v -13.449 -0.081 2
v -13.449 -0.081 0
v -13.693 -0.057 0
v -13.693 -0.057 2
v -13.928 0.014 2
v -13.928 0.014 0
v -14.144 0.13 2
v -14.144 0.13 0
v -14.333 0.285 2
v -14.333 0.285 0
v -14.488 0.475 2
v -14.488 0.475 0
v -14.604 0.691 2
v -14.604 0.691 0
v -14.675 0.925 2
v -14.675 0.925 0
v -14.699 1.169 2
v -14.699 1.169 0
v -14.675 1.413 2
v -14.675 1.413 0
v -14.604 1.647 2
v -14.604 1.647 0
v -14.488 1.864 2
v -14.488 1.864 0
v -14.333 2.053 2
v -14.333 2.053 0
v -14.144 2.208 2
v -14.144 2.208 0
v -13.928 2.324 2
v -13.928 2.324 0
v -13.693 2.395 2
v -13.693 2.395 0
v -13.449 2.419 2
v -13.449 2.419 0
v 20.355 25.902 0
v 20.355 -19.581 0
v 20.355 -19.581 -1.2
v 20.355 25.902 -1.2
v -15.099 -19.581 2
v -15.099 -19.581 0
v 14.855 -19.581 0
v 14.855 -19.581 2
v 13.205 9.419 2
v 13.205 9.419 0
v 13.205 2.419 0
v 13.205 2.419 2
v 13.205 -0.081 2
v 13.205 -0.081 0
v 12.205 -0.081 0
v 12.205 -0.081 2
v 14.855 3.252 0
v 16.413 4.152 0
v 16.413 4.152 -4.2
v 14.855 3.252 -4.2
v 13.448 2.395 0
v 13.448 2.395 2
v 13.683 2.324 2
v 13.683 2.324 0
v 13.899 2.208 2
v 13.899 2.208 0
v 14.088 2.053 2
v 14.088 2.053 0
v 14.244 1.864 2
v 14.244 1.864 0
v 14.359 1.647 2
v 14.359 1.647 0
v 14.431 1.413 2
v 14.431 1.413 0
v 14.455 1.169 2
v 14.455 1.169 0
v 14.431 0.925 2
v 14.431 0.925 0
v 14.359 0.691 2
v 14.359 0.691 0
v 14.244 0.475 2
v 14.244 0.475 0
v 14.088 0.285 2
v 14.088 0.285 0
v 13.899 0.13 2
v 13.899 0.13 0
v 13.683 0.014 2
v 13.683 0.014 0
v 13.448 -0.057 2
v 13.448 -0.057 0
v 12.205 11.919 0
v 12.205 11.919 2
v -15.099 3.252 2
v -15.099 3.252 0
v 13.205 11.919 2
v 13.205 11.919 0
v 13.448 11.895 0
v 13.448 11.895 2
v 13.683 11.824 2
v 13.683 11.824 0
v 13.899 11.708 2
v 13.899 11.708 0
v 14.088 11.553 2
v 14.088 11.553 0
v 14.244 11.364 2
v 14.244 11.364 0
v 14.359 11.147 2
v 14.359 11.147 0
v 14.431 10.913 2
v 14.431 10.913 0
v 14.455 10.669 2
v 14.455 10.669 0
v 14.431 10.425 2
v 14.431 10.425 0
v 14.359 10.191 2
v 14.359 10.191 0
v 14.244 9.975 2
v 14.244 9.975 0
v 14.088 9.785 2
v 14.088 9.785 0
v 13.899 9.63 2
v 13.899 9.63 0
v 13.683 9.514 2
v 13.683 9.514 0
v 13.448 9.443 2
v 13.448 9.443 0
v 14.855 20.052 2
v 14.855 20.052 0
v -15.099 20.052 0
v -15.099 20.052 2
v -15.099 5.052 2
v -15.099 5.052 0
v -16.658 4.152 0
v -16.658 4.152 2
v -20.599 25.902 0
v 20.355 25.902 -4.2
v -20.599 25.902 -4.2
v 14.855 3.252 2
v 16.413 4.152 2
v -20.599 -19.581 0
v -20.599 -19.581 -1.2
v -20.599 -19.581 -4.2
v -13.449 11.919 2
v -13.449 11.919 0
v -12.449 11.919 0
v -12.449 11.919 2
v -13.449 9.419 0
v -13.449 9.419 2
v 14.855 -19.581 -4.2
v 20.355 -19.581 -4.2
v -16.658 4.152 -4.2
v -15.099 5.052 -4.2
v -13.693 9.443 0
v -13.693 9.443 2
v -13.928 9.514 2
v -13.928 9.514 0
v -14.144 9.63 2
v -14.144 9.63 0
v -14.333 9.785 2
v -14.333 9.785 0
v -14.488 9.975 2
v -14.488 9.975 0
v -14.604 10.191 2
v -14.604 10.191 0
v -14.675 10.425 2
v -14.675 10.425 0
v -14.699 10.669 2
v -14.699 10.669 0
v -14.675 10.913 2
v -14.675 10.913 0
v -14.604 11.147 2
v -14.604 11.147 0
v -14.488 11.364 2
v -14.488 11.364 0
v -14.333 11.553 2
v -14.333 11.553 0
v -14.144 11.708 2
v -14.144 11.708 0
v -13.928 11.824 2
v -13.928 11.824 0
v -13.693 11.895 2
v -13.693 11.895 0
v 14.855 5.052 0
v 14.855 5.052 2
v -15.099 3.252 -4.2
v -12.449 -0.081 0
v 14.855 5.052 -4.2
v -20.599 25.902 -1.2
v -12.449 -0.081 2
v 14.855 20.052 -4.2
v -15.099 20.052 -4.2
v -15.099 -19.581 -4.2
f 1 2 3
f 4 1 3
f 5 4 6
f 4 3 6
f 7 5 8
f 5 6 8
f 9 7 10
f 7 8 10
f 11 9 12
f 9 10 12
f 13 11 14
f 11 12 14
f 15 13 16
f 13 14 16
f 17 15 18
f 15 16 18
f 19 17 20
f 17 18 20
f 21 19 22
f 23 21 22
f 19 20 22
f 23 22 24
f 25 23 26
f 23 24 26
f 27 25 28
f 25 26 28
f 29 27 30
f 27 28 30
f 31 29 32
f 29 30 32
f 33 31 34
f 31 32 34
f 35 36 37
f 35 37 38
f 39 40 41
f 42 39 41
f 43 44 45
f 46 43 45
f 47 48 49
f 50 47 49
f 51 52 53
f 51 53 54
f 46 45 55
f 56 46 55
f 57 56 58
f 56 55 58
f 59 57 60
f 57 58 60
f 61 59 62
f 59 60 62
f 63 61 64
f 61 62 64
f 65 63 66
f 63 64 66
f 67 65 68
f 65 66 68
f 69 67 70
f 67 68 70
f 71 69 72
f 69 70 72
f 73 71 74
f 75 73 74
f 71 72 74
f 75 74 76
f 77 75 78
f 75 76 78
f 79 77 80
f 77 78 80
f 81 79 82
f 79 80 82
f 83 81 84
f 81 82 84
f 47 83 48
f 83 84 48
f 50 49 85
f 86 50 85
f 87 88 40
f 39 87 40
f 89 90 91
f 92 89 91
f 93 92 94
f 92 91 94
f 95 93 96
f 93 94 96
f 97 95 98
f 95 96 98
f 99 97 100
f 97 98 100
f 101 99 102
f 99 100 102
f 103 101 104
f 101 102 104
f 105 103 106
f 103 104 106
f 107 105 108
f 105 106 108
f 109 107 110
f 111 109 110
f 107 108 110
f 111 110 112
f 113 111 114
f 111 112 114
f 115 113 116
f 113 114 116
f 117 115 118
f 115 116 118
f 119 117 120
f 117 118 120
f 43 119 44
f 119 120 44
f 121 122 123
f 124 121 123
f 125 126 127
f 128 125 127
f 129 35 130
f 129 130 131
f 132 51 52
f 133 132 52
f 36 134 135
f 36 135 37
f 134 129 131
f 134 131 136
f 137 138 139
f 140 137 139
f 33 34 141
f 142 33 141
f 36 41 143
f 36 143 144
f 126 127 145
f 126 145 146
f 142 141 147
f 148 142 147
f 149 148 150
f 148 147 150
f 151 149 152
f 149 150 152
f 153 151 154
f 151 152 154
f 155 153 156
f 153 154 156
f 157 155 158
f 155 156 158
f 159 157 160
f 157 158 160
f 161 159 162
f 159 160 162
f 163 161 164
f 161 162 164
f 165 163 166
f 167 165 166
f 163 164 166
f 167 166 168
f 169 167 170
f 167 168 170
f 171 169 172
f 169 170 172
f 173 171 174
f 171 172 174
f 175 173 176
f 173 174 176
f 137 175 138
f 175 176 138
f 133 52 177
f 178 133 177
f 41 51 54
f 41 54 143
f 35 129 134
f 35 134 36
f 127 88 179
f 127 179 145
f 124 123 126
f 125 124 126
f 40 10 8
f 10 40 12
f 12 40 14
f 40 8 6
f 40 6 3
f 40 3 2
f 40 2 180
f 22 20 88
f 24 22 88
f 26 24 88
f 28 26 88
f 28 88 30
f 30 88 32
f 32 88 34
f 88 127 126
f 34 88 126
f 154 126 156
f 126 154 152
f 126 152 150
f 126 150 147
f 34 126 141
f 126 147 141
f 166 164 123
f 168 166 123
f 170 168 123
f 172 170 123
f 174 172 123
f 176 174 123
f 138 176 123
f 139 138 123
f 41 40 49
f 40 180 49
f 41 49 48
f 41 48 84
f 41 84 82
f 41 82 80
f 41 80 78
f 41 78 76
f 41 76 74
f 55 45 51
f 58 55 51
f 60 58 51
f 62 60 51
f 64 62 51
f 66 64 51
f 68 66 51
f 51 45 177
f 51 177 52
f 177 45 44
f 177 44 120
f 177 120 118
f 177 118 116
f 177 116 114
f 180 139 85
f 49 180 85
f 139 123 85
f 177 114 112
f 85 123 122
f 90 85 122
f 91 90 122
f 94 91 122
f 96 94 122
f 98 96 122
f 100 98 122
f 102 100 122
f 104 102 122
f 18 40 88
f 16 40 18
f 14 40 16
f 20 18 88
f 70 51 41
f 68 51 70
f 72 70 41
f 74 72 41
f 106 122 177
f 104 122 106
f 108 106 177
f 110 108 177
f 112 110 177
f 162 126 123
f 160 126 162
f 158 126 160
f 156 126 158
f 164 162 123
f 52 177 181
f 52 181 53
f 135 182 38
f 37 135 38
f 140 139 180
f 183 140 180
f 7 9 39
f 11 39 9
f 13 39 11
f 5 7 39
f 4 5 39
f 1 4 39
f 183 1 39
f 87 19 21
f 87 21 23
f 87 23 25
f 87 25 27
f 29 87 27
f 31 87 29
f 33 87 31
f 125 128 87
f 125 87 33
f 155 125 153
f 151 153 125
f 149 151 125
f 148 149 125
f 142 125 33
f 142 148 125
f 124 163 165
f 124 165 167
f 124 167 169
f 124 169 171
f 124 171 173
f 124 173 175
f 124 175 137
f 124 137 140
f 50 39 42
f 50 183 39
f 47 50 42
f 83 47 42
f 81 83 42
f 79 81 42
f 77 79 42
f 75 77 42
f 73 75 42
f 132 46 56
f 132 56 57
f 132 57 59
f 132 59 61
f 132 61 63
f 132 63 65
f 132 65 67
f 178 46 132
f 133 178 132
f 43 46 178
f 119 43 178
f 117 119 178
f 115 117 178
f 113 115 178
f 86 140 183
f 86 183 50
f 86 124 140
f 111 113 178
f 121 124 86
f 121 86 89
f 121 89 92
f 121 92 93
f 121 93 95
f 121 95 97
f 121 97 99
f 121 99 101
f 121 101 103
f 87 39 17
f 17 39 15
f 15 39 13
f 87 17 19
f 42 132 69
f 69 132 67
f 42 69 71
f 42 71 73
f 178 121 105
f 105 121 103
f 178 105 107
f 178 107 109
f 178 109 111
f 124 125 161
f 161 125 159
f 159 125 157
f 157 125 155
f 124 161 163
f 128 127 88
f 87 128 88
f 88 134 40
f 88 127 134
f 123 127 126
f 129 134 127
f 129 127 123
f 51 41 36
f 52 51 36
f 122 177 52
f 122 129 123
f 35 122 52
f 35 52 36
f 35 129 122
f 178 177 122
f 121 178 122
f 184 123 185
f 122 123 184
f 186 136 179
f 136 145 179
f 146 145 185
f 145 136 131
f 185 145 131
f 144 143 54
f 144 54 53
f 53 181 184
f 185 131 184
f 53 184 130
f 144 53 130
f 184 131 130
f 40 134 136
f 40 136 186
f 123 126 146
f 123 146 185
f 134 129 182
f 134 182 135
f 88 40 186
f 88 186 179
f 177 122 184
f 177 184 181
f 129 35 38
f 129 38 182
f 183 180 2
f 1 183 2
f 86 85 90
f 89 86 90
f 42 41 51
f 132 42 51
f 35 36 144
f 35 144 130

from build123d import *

# Parameters (mm, degrees)
F1_DEPTH = 2
F2_DEPTH = 4.2
F3_DEPTH = 1.2


with BuildPart() as f1:
    # F0 (on Top) → F1 (new body)
    with BuildSketch(Plane.XY):
        Polygon((-15.099153, 3.251887), (-15.099153, -19.581107), (-0.145396, -19.581107), (-0.099153, -19.581107), (14.854604, -19.581107), (14.854604, 3.251887), (16.413449, 4.151887), (14.854604, 5.051887), (14.854604, 20.051887), (-0.122275, 20.051887), (-15.099153, 20.051887), (-15.099153, 5.051887), (-16.657999, 4.151887), align=None)
        with BuildLine():
            ThreePointArc((-13.449153, 9.419125), (-14.699153, 10.669125), (-13.449153, 11.919125))
            Line((-13.449153, 11.919125), (-12.449153, 11.919125))
            Line((-12.449153, 11.919125), (-12.449153, -0.080875))
            Line((-12.449153, -0.080875), (-13.449153, -0.080875))
            ThreePointArc((-13.449153, -0.080875), (-14.699153, 1.169125), (-13.449153, 2.419125))
            Line((-13.449153, 2.419125), (-13.449153, 9.419125))
        make_face(mode=Mode.SUBTRACT)
        with BuildLine():
            ThreePointArc((13.204604, 2.419125), (14.454604, 1.169125), (13.204604, -0.080875))
            Line((13.204604, -0.080875), (12.204604, -0.080875))
            Line((12.204604, -0.080875), (12.204604, 11.919125))
            Line((12.204604, 11.919125), (13.204604, 11.919125))
            ThreePointArc((13.204604, 11.919125), (14.454604, 10.669125), (13.204604, 9.419125))
            Line((13.204604, 9.419125), (13.204604, 2.419125))
        make_face(mode=Mode.SUBTRACT)
    extrude(amount=F1_DEPTH)


with BuildPart() as f2:
    # F0 (on Top) → F2 (new body)
    with BuildSketch(Plane.XY):
        Polygon((-20.599153, -4.098113), (-15.599153, -4.098113), (-15.599153, 3.151887), (-17.331204, 4.151887), (-15.599153, 5.151887), (-15.599153, 20.901887), (-15.599153, 25.901887), (-20.599153, 25.901887), align=None)
        Polygon((-15.599153, 3.151887), (-15.599153, -4.098113), (-20.599153, -4.098113), (-20.599153, -19.581107), (-15.099153, -19.581107), (-15.099153, 3.251887), (-16.657999, 4.151887), (-15.099153, 5.051887), (-15.099153, 20.051887), (-0.122275, 20.051887), (14.854604, 20.051887), (14.854604, 5.051887), (16.413449, 4.151887), (14.854604, 3.251887), (14.854604, -19.581107), (20.354604, -19.581107), (20.354604, -4.098113), (15.354604, -4.098113), (15.354604, 3.151887), (17.086655, 4.151887), (15.354604, 5.151887), (15.354604, 20.901887), (15.354604, 25.901887), (0.299157, 25.901887), (-0.122275, 25.901887), (-0.543707, 25.901887), (-15.599153, 25.901887), (-15.599153, 20.901887), (-15.599153, 5.151887), (-17.331204, 4.151887), align=None)
        Polygon((20.354604, 25.901887), (15.354604, 25.901887), (15.354604, 20.901887), (15.354604, 5.151887), (17.086655, 4.151887), (15.354604, 3.151887), (15.354604, -4.098113), (20.354604, -4.098113), align=None)
    extrude(amount=-F2_DEPTH)


with BuildPart() as f3:
    # F0 (on Top) → F3 (new body)
    with BuildSketch(Plane.XY):
        Polygon((20.354604, 25.901887), (15.354604, 25.901887), (15.354604, 20.901887), (15.354604, 5.151887), (17.086655, 4.151887), (15.354604, 3.151887), (15.354604, -4.098113), (20.354604, -4.098113), align=None)
        Polygon((-15.099153, 3.251887), (-15.099153, -19.581107), (-0.145396, -19.581107), (-0.099153, -19.581107), (14.854604, -19.581107), (14.854604, 3.251887), (16.413449, 4.151887), (14.854604, 5.051887), (14.854604, 20.051887), (-0.122275, 20.051887), (-15.099153, 20.051887), (-15.099153, 5.051887), (-16.657999, 4.151887), align=None)
        with BuildLine():
            ThreePointArc((-13.449153, 9.419125), (-14.699153, 10.669125), (-13.449153, 11.919125))
            Line((-13.449153, 11.919125), (-12.449153, 11.919125))
            Line((-12.449153, 11.919125), (-12.449153, -0.080875))
            Line((-12.449153, -0.080875), (-13.449153, -0.080875))
            ThreePointArc((-13.449153, -0.080875), (-14.699153, 1.169125), (-13.449153, 2.419125))
            Line((-13.449153, 2.419125), (-13.449153, 9.419125))
        make_face(mode=Mode.SUBTRACT)
        with BuildLine():
            ThreePointArc((13.204604, 2.419125), (14.454604, 1.169125), (13.204604, -0.080875))
            Line((13.204604, -0.080875), (12.204604, -0.080875))
            Line((12.204604, -0.080875), (12.204604, 11.919125))
            Line((12.204604, 11.919125), (13.204604, 11.919125))
            ThreePointArc((13.204604, 11.919125), (14.454604, 10.669125), (13.204604, 9.419125))
            Line((13.204604, 9.419125), (13.204604, 2.419125))
        make_face(mode=Mode.SUBTRACT)
        Polygon((-15.599153, 3.151887), (-15.599153, -4.098113), (-20.599153, -4.098113), (-20.599153, -19.581107), (-15.099153, -19.581107), (-15.099153, 3.251887), (-16.657999, 4.151887), (-15.099153, 5.051887), (-15.099153, 20.051887), (-0.122275, 20.051887), (14.854604, 20.051887), (14.854604, 5.051887), (16.413449, 4.151887), (14.854604, 3.251887), (14.854604, -19.581107), (20.354604, -19.581107), (20.354604, -4.098113), (15.354604, -4.098113), (15.354604, 3.151887), (17.086655, 4.151887), (15.354604, 5.151887), (15.354604, 20.901887), (15.354604, 25.901887), (0.299157, 25.901887), (-0.122275, 25.901887), (-0.543707, 25.901887), (-15.599153, 25.901887), (-15.599153, 20.901887), (-15.599153, 5.151887), (-17.331204, 4.151887), align=None)
        Polygon((-20.599153, -4.098113), (-15.599153, -4.098113), (-15.599153, 3.151887), (-17.331204, 4.151887), (-15.599153, 5.151887), (-15.599153, 20.901887), (-15.599153, 25.901887), (-20.599153, 25.901887), align=None)
        with BuildLine():
            Line((-12.449153, 11.919125), (-13.449153, 11.919125))
            ThreePointArc((-13.449153, 11.919125), (-14.699153, 10.669125), (-13.449153, 9.419125))
            Line((-13.449153, 9.419125), (-13.449153, 2.419125))
            ThreePointArc((-13.449153, 2.419125), (-14.699153, 1.169125), (-13.449153, -0.080875))
            Line((-13.449153, -0.080875), (-12.449153, -0.080875))
            Line((-12.449153, -0.080875), (-12.449153, 11.919125))
        make_face()
        with BuildLine():
            Line((12.204604, -0.080875), (13.204604, -0.080875))
            ThreePointArc((13.204604, -0.080875), (14.454604, 1.169125), (13.204604, 2.419125))
            Line((13.204604, 2.419125), (13.204604, 9.419125))
            ThreePointArc((13.204604, 9.419125), (14.454604, 10.669125), (13.204604, 11.919125))
            Line((13.204604, 11.919125), (12.204604, 11.919125))
            Line((12.204604, 11.919125), (12.204604, -0.080875))
        make_face()
    extrude(amount=-F3_DEPTH)


solid = Compound([f1.part, f2.part, f3.part])
